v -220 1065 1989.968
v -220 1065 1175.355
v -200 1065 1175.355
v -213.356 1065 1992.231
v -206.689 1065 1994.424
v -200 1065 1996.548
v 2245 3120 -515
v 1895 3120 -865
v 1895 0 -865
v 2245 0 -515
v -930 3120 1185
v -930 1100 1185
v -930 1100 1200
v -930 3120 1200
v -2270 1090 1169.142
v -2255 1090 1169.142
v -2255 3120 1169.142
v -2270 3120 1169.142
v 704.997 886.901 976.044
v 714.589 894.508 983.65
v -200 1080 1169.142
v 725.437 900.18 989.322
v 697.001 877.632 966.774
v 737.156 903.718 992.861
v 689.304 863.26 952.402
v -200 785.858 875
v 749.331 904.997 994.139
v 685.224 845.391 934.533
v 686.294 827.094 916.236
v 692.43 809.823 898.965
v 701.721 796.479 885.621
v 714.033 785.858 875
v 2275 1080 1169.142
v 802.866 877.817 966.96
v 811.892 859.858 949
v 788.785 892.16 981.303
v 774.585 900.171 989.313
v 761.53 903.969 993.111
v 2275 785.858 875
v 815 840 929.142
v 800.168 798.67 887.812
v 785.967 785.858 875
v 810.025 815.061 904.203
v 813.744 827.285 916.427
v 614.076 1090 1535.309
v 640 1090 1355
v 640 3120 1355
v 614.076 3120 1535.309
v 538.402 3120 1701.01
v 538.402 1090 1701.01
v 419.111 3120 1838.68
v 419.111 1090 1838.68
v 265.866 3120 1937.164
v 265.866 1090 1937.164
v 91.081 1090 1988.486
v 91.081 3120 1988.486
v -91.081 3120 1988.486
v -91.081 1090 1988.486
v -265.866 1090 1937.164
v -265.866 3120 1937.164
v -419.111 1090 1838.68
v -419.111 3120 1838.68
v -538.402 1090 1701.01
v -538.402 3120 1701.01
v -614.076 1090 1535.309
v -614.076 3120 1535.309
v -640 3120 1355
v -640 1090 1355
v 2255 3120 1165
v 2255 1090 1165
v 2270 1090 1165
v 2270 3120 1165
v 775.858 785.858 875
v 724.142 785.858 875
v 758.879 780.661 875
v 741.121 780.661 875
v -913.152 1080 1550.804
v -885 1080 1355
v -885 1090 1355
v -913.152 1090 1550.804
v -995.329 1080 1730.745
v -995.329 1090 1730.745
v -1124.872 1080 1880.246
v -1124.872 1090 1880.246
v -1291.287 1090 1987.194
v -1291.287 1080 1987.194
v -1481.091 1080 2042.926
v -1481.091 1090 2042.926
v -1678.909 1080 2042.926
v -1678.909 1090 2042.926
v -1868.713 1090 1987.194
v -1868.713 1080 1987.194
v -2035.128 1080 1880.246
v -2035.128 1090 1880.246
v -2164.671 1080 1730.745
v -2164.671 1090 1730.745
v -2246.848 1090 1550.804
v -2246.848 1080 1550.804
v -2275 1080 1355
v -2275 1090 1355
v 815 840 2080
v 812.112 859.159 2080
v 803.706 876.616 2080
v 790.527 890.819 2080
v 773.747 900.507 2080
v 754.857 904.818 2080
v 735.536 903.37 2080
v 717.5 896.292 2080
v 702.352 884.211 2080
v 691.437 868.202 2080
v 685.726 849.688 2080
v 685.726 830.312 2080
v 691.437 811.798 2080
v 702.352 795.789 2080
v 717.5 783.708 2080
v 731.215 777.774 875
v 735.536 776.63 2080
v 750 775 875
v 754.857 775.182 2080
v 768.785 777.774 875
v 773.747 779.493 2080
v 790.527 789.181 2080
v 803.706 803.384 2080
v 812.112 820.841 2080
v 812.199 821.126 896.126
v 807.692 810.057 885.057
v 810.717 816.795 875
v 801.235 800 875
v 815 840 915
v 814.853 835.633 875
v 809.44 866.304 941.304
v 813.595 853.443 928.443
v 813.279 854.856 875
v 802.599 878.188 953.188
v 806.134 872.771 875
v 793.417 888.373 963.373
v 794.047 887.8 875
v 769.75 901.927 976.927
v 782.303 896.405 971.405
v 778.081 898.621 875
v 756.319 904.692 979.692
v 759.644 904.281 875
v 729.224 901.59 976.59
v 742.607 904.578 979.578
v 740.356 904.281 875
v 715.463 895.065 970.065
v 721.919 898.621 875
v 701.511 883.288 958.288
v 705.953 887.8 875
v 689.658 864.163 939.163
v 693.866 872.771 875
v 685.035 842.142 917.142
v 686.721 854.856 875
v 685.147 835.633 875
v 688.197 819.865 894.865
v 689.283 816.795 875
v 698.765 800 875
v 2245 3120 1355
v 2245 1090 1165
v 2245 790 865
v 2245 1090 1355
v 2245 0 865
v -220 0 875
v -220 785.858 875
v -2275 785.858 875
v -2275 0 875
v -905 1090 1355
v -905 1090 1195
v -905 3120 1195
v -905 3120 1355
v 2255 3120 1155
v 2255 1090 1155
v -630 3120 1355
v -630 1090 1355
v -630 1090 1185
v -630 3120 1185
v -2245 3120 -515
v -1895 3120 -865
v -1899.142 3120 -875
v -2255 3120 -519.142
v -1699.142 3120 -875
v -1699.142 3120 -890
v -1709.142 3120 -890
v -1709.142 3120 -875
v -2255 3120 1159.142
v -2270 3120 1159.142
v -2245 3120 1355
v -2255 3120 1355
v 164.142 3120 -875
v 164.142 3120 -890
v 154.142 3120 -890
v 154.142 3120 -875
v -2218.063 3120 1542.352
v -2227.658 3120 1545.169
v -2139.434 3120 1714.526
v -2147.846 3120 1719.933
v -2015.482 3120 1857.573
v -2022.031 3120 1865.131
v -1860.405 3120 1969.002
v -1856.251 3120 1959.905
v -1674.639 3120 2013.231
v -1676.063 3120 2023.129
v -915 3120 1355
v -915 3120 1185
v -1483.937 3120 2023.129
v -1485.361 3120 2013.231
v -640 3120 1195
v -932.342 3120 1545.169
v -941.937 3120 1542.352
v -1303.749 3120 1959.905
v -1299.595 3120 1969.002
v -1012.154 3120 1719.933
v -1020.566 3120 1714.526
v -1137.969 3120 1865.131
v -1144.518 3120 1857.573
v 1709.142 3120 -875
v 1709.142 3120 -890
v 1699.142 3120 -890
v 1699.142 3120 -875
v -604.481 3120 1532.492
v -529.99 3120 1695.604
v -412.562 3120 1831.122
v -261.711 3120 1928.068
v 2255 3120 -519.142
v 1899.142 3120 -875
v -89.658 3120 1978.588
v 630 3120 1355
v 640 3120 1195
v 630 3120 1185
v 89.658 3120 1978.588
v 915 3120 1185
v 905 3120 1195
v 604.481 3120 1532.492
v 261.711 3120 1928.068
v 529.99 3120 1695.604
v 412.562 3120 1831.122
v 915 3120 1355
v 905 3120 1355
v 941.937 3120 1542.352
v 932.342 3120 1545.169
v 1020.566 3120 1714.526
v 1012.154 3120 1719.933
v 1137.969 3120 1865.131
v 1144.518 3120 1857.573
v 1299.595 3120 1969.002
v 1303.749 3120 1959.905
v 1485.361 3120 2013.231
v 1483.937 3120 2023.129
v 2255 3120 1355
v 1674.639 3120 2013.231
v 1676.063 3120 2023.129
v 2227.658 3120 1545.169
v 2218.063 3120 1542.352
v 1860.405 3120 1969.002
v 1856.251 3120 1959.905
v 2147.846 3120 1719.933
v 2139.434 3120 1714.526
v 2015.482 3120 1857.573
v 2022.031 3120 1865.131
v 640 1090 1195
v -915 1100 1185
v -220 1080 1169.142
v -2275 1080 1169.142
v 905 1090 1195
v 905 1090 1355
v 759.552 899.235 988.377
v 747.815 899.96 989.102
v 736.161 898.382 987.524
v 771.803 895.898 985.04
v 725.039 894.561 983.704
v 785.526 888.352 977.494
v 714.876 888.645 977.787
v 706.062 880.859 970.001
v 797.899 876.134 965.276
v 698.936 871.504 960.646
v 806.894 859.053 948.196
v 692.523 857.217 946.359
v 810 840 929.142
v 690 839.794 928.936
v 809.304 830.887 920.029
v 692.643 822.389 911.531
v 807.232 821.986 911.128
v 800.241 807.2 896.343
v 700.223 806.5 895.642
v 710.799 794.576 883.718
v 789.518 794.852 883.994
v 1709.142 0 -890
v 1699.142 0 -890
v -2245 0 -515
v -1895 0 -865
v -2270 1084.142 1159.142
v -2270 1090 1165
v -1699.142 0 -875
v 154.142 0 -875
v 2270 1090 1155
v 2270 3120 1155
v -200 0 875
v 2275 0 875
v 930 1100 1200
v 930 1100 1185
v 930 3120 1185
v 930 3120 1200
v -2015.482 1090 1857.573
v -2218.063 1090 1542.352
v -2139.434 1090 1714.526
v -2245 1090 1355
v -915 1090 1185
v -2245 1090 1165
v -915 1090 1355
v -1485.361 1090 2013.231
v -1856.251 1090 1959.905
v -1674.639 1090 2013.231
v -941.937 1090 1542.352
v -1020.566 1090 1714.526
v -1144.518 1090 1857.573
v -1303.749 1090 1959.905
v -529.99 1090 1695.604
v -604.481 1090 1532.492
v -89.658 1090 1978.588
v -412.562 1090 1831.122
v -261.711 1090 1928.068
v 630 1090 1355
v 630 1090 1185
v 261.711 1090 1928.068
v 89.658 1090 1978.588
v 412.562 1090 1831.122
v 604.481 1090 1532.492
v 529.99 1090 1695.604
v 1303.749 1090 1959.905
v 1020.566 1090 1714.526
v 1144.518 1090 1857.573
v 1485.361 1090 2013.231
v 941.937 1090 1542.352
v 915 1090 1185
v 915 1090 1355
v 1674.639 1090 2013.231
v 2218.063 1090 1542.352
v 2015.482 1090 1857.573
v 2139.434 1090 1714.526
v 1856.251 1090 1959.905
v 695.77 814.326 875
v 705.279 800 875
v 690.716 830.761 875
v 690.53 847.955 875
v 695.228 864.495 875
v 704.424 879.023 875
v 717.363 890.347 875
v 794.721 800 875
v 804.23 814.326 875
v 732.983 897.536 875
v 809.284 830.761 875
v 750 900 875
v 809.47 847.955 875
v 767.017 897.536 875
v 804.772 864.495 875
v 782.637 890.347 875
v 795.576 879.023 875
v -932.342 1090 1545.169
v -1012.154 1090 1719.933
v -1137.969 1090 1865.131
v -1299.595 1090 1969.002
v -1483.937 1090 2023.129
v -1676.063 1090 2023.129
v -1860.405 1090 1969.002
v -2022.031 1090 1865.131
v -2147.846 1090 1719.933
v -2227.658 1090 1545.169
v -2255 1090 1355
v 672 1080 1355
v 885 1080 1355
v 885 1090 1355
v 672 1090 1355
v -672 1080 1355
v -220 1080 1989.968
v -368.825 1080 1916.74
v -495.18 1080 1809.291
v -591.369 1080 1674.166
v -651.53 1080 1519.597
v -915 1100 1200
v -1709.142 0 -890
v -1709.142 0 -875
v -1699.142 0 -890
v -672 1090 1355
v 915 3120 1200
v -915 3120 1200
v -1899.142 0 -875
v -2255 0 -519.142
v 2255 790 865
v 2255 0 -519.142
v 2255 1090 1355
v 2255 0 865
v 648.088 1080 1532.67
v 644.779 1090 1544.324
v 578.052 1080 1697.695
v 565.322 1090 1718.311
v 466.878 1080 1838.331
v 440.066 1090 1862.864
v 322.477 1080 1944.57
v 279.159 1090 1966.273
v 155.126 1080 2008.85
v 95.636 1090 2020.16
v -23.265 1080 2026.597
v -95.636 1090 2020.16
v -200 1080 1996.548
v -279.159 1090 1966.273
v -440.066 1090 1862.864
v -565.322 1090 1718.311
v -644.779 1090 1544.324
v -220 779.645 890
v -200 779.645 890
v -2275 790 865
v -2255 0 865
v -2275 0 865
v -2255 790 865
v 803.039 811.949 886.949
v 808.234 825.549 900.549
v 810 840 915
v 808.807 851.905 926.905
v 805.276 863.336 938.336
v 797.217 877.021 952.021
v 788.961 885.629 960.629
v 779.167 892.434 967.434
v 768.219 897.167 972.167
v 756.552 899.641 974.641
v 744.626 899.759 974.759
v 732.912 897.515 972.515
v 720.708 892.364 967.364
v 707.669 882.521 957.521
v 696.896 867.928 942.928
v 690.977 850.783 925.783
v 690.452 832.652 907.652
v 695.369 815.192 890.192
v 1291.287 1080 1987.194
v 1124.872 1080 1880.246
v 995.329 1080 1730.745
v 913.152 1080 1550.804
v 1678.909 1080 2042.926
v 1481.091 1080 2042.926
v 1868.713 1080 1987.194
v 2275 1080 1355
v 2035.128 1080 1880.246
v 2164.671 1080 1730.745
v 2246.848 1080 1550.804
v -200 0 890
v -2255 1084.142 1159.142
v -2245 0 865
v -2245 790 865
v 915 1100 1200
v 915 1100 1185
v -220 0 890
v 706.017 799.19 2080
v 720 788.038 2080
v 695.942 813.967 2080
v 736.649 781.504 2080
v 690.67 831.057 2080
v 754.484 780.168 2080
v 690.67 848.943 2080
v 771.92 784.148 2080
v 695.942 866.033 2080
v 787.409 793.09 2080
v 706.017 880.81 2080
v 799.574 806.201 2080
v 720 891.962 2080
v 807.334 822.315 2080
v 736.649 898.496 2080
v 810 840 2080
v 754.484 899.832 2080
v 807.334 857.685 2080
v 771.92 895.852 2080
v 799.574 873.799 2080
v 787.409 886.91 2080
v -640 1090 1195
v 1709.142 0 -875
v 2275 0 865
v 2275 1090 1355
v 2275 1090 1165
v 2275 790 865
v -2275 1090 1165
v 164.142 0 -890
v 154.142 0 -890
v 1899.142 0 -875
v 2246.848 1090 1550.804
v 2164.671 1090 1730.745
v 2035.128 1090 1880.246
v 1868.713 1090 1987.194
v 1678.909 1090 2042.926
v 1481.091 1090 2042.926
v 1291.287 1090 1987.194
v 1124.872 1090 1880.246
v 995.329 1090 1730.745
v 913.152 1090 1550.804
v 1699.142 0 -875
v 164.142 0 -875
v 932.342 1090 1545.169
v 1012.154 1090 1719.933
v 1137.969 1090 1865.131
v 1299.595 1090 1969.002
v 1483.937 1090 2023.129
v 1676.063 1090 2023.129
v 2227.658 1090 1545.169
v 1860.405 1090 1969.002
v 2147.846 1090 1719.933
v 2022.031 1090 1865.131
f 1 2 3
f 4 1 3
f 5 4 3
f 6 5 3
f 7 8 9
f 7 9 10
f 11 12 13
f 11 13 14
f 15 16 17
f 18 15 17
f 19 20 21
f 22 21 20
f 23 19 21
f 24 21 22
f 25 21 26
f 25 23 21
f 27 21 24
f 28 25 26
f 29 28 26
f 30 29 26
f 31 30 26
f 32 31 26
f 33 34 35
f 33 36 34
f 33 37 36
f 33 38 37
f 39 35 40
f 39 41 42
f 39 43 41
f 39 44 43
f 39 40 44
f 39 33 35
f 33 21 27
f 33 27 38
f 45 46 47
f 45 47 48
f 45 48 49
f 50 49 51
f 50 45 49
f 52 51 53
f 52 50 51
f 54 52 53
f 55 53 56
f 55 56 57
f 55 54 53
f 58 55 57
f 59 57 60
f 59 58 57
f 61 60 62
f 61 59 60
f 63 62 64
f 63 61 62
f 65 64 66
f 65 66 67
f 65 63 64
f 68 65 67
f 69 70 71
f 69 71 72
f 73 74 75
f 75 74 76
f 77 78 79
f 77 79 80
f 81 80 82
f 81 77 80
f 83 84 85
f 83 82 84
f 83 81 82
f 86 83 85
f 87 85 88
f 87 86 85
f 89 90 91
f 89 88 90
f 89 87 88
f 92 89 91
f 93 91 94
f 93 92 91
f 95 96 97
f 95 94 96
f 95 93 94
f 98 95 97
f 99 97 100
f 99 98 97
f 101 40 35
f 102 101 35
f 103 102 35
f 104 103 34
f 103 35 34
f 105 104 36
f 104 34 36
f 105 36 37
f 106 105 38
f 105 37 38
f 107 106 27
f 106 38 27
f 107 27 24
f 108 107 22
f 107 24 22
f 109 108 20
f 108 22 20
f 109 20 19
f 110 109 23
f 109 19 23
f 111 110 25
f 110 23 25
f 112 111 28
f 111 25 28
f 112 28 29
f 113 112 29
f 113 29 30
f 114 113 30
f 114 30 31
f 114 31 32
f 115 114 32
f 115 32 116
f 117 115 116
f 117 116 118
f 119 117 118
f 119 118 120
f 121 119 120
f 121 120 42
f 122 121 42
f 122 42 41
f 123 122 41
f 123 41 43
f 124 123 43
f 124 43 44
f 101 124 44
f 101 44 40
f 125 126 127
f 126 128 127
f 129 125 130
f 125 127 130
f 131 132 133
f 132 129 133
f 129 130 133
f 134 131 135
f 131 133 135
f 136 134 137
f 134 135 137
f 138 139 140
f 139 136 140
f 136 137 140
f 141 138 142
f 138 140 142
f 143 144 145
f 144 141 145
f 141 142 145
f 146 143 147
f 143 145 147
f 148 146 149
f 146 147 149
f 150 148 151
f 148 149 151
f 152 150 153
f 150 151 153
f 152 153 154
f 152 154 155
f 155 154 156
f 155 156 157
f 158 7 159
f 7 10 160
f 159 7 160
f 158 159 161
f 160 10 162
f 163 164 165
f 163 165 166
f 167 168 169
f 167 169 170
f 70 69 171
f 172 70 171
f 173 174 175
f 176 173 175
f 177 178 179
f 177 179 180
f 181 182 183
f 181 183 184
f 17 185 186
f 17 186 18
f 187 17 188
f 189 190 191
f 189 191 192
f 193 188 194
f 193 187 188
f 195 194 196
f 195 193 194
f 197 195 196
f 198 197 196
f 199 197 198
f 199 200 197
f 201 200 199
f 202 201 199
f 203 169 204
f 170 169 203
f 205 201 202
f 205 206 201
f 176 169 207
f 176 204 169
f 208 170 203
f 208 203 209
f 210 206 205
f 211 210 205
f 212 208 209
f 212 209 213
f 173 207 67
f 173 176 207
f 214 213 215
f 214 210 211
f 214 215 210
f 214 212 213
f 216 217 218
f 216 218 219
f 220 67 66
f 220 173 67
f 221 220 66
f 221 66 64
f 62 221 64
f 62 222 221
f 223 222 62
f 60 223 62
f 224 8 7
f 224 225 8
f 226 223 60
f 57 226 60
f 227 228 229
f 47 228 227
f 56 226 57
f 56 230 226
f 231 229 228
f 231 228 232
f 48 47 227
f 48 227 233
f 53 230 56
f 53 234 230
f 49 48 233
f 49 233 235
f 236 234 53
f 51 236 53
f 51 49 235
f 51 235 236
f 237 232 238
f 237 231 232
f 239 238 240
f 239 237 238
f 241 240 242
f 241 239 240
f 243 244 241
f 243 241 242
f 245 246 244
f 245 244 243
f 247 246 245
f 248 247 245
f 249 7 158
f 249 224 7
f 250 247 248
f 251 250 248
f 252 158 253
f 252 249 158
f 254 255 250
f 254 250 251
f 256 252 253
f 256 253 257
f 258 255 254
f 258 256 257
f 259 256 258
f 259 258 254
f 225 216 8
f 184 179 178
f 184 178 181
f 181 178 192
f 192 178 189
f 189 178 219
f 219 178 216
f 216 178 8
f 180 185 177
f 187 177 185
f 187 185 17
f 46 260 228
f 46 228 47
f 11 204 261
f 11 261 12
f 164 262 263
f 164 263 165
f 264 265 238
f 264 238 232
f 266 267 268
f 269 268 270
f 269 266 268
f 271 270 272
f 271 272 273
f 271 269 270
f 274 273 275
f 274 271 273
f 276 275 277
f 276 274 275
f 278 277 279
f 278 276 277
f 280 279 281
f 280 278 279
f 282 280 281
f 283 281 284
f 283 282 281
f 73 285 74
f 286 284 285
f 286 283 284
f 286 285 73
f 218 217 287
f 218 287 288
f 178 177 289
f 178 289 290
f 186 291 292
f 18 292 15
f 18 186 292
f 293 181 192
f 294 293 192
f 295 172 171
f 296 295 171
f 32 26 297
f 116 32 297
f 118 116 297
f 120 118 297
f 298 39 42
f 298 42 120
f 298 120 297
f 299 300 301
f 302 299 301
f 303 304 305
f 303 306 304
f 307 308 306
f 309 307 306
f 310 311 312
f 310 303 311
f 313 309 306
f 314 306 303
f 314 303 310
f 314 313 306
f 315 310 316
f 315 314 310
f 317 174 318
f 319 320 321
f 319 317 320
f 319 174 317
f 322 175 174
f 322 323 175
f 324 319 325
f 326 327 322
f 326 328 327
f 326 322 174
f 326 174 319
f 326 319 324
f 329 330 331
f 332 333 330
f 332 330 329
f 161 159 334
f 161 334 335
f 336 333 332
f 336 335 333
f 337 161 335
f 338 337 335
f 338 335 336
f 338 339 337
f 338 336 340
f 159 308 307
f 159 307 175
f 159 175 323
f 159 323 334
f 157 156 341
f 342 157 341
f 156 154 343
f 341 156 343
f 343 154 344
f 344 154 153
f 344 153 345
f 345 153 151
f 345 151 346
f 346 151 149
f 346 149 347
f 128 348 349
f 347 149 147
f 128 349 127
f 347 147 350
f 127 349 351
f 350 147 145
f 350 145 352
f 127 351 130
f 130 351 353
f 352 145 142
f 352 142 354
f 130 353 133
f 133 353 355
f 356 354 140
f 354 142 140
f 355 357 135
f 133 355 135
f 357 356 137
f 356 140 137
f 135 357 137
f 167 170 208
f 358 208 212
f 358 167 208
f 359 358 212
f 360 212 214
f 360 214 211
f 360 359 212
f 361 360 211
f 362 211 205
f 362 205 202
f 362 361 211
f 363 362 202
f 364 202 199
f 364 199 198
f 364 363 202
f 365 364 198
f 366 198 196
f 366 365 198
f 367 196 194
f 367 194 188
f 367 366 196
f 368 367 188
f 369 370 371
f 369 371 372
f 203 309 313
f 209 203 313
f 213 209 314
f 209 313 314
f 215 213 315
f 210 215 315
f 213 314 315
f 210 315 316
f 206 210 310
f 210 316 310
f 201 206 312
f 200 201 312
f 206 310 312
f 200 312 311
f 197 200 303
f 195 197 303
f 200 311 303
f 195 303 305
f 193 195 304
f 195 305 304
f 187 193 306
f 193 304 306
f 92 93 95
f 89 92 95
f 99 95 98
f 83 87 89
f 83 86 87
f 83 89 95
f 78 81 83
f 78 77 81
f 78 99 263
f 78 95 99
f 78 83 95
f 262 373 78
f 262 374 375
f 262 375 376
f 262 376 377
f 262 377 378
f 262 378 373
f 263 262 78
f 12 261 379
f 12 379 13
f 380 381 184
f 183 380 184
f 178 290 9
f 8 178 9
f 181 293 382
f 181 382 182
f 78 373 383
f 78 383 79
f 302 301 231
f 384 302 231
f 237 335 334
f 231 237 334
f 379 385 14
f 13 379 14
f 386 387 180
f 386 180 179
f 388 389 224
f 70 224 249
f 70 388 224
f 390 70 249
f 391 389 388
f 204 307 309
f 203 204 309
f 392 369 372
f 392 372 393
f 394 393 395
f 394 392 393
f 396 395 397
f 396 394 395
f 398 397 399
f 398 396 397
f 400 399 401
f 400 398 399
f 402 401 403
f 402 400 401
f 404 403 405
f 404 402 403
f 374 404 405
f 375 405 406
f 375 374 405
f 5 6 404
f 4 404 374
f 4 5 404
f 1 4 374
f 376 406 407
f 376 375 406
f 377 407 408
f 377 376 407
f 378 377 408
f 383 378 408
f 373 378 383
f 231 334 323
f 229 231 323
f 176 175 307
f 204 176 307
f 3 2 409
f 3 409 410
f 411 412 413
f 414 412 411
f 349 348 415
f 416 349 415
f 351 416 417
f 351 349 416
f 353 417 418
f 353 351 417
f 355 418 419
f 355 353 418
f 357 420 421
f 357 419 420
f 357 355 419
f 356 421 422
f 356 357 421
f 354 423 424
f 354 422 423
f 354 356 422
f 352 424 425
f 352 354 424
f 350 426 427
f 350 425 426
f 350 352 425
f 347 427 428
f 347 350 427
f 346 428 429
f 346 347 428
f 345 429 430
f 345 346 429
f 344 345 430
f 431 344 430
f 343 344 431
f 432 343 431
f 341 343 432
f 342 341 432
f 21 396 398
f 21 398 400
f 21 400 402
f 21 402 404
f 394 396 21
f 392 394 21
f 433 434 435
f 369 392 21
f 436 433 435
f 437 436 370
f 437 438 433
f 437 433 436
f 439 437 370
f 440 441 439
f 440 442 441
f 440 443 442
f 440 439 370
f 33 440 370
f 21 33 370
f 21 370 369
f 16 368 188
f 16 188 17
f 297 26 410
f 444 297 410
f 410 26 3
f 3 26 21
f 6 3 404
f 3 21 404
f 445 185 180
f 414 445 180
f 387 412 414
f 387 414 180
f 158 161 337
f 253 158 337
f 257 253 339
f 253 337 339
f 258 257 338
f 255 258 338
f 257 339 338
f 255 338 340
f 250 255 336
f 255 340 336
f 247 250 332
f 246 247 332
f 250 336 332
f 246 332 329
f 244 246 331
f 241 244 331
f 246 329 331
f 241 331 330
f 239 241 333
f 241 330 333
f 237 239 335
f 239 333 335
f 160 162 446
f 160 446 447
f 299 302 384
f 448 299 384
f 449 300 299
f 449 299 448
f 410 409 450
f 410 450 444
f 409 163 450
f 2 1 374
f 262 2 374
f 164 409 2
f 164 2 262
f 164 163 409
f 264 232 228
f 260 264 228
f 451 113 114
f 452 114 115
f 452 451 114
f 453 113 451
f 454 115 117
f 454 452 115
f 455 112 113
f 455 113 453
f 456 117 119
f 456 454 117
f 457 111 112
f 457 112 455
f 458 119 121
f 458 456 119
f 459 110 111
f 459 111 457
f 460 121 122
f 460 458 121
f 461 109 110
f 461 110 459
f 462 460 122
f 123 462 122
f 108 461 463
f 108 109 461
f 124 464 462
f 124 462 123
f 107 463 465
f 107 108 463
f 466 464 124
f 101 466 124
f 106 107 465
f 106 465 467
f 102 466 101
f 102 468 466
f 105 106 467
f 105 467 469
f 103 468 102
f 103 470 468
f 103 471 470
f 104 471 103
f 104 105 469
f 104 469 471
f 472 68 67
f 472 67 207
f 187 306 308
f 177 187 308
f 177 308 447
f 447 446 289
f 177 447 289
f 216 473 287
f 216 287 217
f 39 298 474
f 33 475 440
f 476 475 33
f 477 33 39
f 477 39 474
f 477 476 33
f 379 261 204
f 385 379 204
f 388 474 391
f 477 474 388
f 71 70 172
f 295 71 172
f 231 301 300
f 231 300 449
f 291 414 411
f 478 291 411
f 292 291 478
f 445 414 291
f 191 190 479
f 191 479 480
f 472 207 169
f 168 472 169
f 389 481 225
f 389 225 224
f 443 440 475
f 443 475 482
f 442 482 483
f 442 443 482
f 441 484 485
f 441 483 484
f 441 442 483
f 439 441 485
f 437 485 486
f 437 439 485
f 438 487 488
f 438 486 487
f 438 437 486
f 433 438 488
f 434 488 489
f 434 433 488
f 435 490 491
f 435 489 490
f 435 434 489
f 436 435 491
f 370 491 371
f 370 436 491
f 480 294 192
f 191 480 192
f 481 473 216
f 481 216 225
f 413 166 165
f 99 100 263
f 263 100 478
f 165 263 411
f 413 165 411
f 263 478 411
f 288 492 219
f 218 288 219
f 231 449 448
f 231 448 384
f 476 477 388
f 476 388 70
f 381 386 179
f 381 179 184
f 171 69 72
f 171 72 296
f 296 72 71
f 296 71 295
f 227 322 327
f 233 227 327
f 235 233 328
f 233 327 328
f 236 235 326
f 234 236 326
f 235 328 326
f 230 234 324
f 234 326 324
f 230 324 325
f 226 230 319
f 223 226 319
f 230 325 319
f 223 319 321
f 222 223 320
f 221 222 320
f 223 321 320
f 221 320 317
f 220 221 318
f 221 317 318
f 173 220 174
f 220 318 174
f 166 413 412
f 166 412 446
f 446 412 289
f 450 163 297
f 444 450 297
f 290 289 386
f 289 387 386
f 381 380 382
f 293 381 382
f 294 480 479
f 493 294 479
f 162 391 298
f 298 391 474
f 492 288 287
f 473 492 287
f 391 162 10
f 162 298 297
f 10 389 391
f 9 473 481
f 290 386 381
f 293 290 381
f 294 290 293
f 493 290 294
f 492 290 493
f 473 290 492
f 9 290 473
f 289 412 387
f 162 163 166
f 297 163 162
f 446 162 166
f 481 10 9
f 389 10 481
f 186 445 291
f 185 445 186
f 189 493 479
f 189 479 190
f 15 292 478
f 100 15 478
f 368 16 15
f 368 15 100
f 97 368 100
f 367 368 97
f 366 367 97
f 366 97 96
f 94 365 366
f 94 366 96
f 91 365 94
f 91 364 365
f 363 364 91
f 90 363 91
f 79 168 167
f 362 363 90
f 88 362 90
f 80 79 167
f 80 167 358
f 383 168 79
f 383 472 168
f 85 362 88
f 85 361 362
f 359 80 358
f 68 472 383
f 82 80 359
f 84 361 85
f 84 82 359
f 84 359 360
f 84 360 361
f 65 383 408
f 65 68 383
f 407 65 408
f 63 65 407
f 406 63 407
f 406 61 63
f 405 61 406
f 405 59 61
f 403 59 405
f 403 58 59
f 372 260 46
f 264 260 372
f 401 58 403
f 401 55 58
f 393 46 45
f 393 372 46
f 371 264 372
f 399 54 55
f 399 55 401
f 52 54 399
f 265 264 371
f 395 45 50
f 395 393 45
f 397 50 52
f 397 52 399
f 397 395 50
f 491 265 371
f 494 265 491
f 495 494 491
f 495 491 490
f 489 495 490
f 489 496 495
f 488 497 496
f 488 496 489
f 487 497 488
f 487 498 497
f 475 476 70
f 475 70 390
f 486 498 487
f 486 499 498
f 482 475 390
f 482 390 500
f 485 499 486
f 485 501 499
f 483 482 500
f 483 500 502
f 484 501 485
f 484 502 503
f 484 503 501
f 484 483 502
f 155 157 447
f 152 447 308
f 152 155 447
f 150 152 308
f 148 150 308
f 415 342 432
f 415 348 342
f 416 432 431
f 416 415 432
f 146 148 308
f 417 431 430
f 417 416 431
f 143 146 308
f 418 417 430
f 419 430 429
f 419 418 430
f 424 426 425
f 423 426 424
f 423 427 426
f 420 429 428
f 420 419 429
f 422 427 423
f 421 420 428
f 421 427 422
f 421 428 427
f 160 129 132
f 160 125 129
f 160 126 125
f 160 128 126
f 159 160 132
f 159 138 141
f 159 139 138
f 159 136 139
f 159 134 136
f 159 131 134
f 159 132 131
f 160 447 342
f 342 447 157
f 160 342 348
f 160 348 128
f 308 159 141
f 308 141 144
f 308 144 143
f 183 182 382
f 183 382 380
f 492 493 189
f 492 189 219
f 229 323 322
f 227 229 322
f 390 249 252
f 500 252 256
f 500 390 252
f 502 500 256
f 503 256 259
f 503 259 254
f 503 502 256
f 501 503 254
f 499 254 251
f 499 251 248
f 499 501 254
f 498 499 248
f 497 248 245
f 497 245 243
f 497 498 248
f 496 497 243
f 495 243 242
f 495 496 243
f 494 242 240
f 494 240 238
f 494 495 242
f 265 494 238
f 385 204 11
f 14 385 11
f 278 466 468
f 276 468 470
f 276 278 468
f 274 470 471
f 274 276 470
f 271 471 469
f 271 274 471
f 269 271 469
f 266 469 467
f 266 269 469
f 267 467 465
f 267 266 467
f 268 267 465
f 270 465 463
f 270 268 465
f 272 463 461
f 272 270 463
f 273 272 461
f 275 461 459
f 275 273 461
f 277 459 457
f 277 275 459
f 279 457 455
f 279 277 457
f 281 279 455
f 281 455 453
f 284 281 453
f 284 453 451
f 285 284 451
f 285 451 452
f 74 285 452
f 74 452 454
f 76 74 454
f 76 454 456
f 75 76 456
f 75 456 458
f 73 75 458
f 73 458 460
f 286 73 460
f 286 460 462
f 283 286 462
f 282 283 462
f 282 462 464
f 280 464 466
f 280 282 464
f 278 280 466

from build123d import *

# Parameters (mm, degrees)
EXTRUDE_THIN1_DEPTH     = 3120
CUT_EXTRUDE1_DEPTH      = 4353.048368297
CUT_EXTRUDE1_DEPTH_BACK = 4353.048368297
BOSS_EXTRUDE2_DEPTH     = 2275
SKETCH6_W               = 20
SKETCH6_H               = 415.979797465
BOSS_EXTRUDE4_DEPTH     = 15
SKETCH5_W               = 20
SKETCH5_H               = 785.857864376
BOSS_EXTRUDE5_DEPTH     = 15
SKETCH7_W               = 20
SKETCH7_H               = 880.857864376
BOSS_EXTRUDE6_DEPTH     = 15
SKETCH8_W               = 15
SKETCH8_H               = 2020
BOSS_EXTRUDE7_DEPTH     = 15
SKETCH9_W               = 15
SKETCH9_H               = 2020
BOSS_EXTRUDE8_DEPTH     = 15
SKETCH10_W              = 10
SKETCH10_H              = 2030
BOSS_EXTRUDE15_DEPTH    = 15
SKETCH11_W              = 10
SKETCH11_H              = 2040
BOSS_EXTRUDE16_DEPTH    = 15
SKETCH12_W              = 10
SKETCH12_H              = 3120
BOSS_EXTRUDE17_DEPTH    = 15
CUT_EXTRUDE2_DEPTH      = 3675.101931085
CUT_EXTRUDE2_DEPTH_BACK = 3675.101931085
SKETCH14_R              = 65
SKETCH14_R_2            = 60
EXTRUDE_THIN2_DEPTH     = 1205


with BuildPart() as part:
    # Sketch1 → Extrude-Thin1 (new body)
    with BuildSketch(Plane(origin=(0, 0, 0), x_dir=(1, 0, 0), z_dir=(0, 1, 0))):
        with BuildLine():
            Line((905, -1355), (905, -1195))
            Line((905, -1195), (640, -1195))
            Line((640, -1195), (640, -1355))
            ThreePointArc((640, -1355), (0, -1995), (-640, -1355))
            Line((-640, -1355), (-640, -1195))
            Line((-640, -1195), (-905, -1195))
            Line((-905, -1195), (-905, -1355))
            ThreePointArc((-905, -1355), (-1580, -2030), (-2255, -1355))
            Line((-2255, -1355), (-2255, 519.142135624))
            Line((-2255, 519.142135624), (-1899.142135624, 875))
            Line((-1899.142135624, 875), (1899.142135624, 875))
            Line((1899.142135624, 875), (2255, 519.142135624))
            Line((2255, 519.142135624), (2255, -1355))
            ThreePointArc((2255, -1355), (1580, -2030), (905, -1355))
        make_face()
        with BuildLine():
            Line((915, -1355), (915, -1185))
            Line((915, -1185), (630, -1185))
            Line((630, -1185), (630, -1355))
            ThreePointArc((630, -1355), (0, -1985), (-630, -1355))
            Line((-630, -1355), (-630, -1185))
            Line((-630, -1185), (-915, -1185))
            Line((-915, -1185), (-915, -1355))
            ThreePointArc((-915, -1355), (-1580, -2020), (-2245, -1355))
            Line((-2245, -1355), (-2245, 515))
            Line((-2245, 515), (-1895, 865))
            Line((-1895, 865), (1895, 865))
            Line((1895, 865), (2245, 515))
            Line((2245, 515), (2245, -1355))
            ThreePointArc((2245, -1355), (1580, -2020), (915, -1355))
        make_face(mode=Mode.SUBTRACT)
    extrude(amount=EXTRUDE_THIN1_DEPTH)

    # Sketch2 → Cut-Extrude1 (cut, two sides: drawn at the far end of the back side and taken through both)
    with BuildSketch(Plane(origin=(0, 0, 0), x_dir=(0, 0, -1), z_dir=(1, 0, 0)).offset(-CUT_EXTRUDE1_DEPTH_BACK)):
        Polygon((-865, 0), (-865, 790), (-1165, 1090), (-2050, 1090), (-2101.676974478, 1090), (-2101.676974478, -15.106412635), (-865, -15.106412635), align=None)
    extrude(amount=CUT_EXTRUDE1_DEPTH + CUT_EXTRUDE1_DEPTH_BACK, mode=Mode.SUBTRACT)

    # Sketch3 → Boss-Extrude2 (add, symmetric)
    with BuildSketch(Plane(origin=(0, 0, 0), x_dir=(0, 0, -1), z_dir=(1, 0, 0))):
        Polygon((-865, 0), (-865, 790), (-1165, 1090), (-2050, 1090), (-2050, 1080), (-1169.142135624, 1080), (-875, 785.857864376), (-875, 0), align=None)
    extrude(amount=BOSS_EXTRUDE2_DEPTH, both=True)

    # Sketch6 → Boss-Extrude4 (add)
    with BuildSketch(Plane(origin=(0, -44.571067812, 44.571067812), x_dir=(1, 0, 0), z_dir=(0, -0.7071067811865475, 0.7071067811865477))):
        with Locations((-210, 1382.39375722)):
            Rectangle(SKETCH6_W, SKETCH6_H)
    extrude(amount=BOSS_EXTRUDE4_DEPTH)

    # Sketch5 → Boss-Extrude5 (add)
    with BuildSketch(Plane.XY.offset(875)):
        with Locations((-210, 392.928932188)):
            Rectangle(SKETCH5_W, SKETCH5_H)
    extrude(amount=BOSS_EXTRUDE5_DEPTH)

    # Sketch7 → Boss-Extrude6 (add)
    with BuildSketch(Plane.XZ.offset(-1080)):
        with Locations((-210, 1609.571067812)):
            Rectangle(SKETCH7_W, SKETCH7_H)
    extrude(amount=BOSS_EXTRUDE6_DEPTH)

    # Sketch11 → Boss-Extrude16 (add)
    with BuildSketch(Plane.ZY.offset(2255)):
        with Locations((1164.142135624, 2100)):
            Rectangle(SKETCH11_W, SKETCH11_H)
    extrude(amount=BOSS_EXTRUDE16_DEPTH)

    # Sketch12 → Boss-Extrude17 (add)
    with BuildSketch(Plane(origin=(0, 0, -875), x_dir=(-1, 0, 0), z_dir=(0, 0, -1))):
        with Locations((-1704.142135624, 1560)):
            Rectangle(SKETCH12_W, SKETCH12_H)
        with Locations((1704.142135624, 1560)):
            Rectangle(SKETCH12_W, SKETCH12_H)
        with Locations((-159.142135624, 1560)):
            Rectangle(SKETCH12_W, SKETCH12_H)
    extrude(amount=BOSS_EXTRUDE17_DEPTH)

    # Sketch13 → Cut-Extrude2 (cut, two sides: drawn at the far end of the back side and taken through both)
    with BuildSketch(Plane(origin=(0, 1090, 0), x_dir=(1, 0, 0), z_dir=(0, 1, 0)).offset(-CUT_EXTRUDE2_DEPTH_BACK)):
        with BuildLine():
            Line((-2275, -1355), (-2439.252961853, -1355))
            Line((-2439.252961853, -1355), (-2439.252961853, -2187.959139027))
            Line((-2439.252961853, -2187.959139027), (2586.364187852, -2187.959139027))
            Line((2586.364187852, -2187.959139027), (2586.364187852, -1355))
            Line((2586.364187852, -1355), (2275, -1355))
            ThreePointArc((2275, -1355), (1580, -2050), (885, -1355))
            Line((885, -1355), (672, -1355))
            ThreePointArc((672, -1355), (0, -2027), (-672, -1355))
            Line((-672, -1355), (-885, -1355))
            ThreePointArc((-885, -1355), (-1580, -2050), (-2275, -1355))
        make_face()
    extrude(amount=CUT_EXTRUDE2_DEPTH + CUT_EXTRUDE2_DEPTH_BACK, mode=Mode.SUBTRACT)

    # Sketch14 → Extrude-Thin2 (add)
    with BuildSketch(Plane.XY.offset(875)):
        with Locations((750, 840)):
            Circle(SKETCH14_R)
        with Locations((750, 840)):
            Circle(SKETCH14_R_2, mode=Mode.SUBTRACT)
    extrude(amount=EXTRUDE_THIN2_DEPTH)


with BuildPart() as body_2:
    # Sketch8 → Boss-Extrude7 (new body)
    with BuildSketch(Plane(origin=(0, 0, 1185), x_dir=(-1, 0, 0), z_dir=(0, 0, -1))):
        with Locations((922.5, 2110)):
            Rectangle(SKETCH8_W, SKETCH8_H)
    extrude(amount=-BOSS_EXTRUDE7_DEPTH)


with BuildPart() as body_3:
    # Sketch9 → Boss-Extrude8 (new body)
    with BuildSketch(Plane(origin=(0, 0, 1185), x_dir=(-1, 0, 0), z_dir=(0, 0, -1))):
        with Locations((-922.5, 2110)):
            Rectangle(SKETCH9_W, SKETCH9_H)
    extrude(amount=-BOSS_EXTRUDE8_DEPTH)


with BuildPart() as body_4:
    # Sketch10 → Boss-Extrude15 (new body)
    with BuildSketch(Plane(origin=(2255, 0, 0), x_dir=(0, 0, -1), z_dir=(1, 0, 0))):
        with Locations((-1160, 2105)):
            Rectangle(SKETCH10_W, SKETCH10_H)
    extrude(amount=BOSS_EXTRUDE15_DEPTH)


solid = Compound([part.part, body_2.part, body_3.part, body_4.part])
